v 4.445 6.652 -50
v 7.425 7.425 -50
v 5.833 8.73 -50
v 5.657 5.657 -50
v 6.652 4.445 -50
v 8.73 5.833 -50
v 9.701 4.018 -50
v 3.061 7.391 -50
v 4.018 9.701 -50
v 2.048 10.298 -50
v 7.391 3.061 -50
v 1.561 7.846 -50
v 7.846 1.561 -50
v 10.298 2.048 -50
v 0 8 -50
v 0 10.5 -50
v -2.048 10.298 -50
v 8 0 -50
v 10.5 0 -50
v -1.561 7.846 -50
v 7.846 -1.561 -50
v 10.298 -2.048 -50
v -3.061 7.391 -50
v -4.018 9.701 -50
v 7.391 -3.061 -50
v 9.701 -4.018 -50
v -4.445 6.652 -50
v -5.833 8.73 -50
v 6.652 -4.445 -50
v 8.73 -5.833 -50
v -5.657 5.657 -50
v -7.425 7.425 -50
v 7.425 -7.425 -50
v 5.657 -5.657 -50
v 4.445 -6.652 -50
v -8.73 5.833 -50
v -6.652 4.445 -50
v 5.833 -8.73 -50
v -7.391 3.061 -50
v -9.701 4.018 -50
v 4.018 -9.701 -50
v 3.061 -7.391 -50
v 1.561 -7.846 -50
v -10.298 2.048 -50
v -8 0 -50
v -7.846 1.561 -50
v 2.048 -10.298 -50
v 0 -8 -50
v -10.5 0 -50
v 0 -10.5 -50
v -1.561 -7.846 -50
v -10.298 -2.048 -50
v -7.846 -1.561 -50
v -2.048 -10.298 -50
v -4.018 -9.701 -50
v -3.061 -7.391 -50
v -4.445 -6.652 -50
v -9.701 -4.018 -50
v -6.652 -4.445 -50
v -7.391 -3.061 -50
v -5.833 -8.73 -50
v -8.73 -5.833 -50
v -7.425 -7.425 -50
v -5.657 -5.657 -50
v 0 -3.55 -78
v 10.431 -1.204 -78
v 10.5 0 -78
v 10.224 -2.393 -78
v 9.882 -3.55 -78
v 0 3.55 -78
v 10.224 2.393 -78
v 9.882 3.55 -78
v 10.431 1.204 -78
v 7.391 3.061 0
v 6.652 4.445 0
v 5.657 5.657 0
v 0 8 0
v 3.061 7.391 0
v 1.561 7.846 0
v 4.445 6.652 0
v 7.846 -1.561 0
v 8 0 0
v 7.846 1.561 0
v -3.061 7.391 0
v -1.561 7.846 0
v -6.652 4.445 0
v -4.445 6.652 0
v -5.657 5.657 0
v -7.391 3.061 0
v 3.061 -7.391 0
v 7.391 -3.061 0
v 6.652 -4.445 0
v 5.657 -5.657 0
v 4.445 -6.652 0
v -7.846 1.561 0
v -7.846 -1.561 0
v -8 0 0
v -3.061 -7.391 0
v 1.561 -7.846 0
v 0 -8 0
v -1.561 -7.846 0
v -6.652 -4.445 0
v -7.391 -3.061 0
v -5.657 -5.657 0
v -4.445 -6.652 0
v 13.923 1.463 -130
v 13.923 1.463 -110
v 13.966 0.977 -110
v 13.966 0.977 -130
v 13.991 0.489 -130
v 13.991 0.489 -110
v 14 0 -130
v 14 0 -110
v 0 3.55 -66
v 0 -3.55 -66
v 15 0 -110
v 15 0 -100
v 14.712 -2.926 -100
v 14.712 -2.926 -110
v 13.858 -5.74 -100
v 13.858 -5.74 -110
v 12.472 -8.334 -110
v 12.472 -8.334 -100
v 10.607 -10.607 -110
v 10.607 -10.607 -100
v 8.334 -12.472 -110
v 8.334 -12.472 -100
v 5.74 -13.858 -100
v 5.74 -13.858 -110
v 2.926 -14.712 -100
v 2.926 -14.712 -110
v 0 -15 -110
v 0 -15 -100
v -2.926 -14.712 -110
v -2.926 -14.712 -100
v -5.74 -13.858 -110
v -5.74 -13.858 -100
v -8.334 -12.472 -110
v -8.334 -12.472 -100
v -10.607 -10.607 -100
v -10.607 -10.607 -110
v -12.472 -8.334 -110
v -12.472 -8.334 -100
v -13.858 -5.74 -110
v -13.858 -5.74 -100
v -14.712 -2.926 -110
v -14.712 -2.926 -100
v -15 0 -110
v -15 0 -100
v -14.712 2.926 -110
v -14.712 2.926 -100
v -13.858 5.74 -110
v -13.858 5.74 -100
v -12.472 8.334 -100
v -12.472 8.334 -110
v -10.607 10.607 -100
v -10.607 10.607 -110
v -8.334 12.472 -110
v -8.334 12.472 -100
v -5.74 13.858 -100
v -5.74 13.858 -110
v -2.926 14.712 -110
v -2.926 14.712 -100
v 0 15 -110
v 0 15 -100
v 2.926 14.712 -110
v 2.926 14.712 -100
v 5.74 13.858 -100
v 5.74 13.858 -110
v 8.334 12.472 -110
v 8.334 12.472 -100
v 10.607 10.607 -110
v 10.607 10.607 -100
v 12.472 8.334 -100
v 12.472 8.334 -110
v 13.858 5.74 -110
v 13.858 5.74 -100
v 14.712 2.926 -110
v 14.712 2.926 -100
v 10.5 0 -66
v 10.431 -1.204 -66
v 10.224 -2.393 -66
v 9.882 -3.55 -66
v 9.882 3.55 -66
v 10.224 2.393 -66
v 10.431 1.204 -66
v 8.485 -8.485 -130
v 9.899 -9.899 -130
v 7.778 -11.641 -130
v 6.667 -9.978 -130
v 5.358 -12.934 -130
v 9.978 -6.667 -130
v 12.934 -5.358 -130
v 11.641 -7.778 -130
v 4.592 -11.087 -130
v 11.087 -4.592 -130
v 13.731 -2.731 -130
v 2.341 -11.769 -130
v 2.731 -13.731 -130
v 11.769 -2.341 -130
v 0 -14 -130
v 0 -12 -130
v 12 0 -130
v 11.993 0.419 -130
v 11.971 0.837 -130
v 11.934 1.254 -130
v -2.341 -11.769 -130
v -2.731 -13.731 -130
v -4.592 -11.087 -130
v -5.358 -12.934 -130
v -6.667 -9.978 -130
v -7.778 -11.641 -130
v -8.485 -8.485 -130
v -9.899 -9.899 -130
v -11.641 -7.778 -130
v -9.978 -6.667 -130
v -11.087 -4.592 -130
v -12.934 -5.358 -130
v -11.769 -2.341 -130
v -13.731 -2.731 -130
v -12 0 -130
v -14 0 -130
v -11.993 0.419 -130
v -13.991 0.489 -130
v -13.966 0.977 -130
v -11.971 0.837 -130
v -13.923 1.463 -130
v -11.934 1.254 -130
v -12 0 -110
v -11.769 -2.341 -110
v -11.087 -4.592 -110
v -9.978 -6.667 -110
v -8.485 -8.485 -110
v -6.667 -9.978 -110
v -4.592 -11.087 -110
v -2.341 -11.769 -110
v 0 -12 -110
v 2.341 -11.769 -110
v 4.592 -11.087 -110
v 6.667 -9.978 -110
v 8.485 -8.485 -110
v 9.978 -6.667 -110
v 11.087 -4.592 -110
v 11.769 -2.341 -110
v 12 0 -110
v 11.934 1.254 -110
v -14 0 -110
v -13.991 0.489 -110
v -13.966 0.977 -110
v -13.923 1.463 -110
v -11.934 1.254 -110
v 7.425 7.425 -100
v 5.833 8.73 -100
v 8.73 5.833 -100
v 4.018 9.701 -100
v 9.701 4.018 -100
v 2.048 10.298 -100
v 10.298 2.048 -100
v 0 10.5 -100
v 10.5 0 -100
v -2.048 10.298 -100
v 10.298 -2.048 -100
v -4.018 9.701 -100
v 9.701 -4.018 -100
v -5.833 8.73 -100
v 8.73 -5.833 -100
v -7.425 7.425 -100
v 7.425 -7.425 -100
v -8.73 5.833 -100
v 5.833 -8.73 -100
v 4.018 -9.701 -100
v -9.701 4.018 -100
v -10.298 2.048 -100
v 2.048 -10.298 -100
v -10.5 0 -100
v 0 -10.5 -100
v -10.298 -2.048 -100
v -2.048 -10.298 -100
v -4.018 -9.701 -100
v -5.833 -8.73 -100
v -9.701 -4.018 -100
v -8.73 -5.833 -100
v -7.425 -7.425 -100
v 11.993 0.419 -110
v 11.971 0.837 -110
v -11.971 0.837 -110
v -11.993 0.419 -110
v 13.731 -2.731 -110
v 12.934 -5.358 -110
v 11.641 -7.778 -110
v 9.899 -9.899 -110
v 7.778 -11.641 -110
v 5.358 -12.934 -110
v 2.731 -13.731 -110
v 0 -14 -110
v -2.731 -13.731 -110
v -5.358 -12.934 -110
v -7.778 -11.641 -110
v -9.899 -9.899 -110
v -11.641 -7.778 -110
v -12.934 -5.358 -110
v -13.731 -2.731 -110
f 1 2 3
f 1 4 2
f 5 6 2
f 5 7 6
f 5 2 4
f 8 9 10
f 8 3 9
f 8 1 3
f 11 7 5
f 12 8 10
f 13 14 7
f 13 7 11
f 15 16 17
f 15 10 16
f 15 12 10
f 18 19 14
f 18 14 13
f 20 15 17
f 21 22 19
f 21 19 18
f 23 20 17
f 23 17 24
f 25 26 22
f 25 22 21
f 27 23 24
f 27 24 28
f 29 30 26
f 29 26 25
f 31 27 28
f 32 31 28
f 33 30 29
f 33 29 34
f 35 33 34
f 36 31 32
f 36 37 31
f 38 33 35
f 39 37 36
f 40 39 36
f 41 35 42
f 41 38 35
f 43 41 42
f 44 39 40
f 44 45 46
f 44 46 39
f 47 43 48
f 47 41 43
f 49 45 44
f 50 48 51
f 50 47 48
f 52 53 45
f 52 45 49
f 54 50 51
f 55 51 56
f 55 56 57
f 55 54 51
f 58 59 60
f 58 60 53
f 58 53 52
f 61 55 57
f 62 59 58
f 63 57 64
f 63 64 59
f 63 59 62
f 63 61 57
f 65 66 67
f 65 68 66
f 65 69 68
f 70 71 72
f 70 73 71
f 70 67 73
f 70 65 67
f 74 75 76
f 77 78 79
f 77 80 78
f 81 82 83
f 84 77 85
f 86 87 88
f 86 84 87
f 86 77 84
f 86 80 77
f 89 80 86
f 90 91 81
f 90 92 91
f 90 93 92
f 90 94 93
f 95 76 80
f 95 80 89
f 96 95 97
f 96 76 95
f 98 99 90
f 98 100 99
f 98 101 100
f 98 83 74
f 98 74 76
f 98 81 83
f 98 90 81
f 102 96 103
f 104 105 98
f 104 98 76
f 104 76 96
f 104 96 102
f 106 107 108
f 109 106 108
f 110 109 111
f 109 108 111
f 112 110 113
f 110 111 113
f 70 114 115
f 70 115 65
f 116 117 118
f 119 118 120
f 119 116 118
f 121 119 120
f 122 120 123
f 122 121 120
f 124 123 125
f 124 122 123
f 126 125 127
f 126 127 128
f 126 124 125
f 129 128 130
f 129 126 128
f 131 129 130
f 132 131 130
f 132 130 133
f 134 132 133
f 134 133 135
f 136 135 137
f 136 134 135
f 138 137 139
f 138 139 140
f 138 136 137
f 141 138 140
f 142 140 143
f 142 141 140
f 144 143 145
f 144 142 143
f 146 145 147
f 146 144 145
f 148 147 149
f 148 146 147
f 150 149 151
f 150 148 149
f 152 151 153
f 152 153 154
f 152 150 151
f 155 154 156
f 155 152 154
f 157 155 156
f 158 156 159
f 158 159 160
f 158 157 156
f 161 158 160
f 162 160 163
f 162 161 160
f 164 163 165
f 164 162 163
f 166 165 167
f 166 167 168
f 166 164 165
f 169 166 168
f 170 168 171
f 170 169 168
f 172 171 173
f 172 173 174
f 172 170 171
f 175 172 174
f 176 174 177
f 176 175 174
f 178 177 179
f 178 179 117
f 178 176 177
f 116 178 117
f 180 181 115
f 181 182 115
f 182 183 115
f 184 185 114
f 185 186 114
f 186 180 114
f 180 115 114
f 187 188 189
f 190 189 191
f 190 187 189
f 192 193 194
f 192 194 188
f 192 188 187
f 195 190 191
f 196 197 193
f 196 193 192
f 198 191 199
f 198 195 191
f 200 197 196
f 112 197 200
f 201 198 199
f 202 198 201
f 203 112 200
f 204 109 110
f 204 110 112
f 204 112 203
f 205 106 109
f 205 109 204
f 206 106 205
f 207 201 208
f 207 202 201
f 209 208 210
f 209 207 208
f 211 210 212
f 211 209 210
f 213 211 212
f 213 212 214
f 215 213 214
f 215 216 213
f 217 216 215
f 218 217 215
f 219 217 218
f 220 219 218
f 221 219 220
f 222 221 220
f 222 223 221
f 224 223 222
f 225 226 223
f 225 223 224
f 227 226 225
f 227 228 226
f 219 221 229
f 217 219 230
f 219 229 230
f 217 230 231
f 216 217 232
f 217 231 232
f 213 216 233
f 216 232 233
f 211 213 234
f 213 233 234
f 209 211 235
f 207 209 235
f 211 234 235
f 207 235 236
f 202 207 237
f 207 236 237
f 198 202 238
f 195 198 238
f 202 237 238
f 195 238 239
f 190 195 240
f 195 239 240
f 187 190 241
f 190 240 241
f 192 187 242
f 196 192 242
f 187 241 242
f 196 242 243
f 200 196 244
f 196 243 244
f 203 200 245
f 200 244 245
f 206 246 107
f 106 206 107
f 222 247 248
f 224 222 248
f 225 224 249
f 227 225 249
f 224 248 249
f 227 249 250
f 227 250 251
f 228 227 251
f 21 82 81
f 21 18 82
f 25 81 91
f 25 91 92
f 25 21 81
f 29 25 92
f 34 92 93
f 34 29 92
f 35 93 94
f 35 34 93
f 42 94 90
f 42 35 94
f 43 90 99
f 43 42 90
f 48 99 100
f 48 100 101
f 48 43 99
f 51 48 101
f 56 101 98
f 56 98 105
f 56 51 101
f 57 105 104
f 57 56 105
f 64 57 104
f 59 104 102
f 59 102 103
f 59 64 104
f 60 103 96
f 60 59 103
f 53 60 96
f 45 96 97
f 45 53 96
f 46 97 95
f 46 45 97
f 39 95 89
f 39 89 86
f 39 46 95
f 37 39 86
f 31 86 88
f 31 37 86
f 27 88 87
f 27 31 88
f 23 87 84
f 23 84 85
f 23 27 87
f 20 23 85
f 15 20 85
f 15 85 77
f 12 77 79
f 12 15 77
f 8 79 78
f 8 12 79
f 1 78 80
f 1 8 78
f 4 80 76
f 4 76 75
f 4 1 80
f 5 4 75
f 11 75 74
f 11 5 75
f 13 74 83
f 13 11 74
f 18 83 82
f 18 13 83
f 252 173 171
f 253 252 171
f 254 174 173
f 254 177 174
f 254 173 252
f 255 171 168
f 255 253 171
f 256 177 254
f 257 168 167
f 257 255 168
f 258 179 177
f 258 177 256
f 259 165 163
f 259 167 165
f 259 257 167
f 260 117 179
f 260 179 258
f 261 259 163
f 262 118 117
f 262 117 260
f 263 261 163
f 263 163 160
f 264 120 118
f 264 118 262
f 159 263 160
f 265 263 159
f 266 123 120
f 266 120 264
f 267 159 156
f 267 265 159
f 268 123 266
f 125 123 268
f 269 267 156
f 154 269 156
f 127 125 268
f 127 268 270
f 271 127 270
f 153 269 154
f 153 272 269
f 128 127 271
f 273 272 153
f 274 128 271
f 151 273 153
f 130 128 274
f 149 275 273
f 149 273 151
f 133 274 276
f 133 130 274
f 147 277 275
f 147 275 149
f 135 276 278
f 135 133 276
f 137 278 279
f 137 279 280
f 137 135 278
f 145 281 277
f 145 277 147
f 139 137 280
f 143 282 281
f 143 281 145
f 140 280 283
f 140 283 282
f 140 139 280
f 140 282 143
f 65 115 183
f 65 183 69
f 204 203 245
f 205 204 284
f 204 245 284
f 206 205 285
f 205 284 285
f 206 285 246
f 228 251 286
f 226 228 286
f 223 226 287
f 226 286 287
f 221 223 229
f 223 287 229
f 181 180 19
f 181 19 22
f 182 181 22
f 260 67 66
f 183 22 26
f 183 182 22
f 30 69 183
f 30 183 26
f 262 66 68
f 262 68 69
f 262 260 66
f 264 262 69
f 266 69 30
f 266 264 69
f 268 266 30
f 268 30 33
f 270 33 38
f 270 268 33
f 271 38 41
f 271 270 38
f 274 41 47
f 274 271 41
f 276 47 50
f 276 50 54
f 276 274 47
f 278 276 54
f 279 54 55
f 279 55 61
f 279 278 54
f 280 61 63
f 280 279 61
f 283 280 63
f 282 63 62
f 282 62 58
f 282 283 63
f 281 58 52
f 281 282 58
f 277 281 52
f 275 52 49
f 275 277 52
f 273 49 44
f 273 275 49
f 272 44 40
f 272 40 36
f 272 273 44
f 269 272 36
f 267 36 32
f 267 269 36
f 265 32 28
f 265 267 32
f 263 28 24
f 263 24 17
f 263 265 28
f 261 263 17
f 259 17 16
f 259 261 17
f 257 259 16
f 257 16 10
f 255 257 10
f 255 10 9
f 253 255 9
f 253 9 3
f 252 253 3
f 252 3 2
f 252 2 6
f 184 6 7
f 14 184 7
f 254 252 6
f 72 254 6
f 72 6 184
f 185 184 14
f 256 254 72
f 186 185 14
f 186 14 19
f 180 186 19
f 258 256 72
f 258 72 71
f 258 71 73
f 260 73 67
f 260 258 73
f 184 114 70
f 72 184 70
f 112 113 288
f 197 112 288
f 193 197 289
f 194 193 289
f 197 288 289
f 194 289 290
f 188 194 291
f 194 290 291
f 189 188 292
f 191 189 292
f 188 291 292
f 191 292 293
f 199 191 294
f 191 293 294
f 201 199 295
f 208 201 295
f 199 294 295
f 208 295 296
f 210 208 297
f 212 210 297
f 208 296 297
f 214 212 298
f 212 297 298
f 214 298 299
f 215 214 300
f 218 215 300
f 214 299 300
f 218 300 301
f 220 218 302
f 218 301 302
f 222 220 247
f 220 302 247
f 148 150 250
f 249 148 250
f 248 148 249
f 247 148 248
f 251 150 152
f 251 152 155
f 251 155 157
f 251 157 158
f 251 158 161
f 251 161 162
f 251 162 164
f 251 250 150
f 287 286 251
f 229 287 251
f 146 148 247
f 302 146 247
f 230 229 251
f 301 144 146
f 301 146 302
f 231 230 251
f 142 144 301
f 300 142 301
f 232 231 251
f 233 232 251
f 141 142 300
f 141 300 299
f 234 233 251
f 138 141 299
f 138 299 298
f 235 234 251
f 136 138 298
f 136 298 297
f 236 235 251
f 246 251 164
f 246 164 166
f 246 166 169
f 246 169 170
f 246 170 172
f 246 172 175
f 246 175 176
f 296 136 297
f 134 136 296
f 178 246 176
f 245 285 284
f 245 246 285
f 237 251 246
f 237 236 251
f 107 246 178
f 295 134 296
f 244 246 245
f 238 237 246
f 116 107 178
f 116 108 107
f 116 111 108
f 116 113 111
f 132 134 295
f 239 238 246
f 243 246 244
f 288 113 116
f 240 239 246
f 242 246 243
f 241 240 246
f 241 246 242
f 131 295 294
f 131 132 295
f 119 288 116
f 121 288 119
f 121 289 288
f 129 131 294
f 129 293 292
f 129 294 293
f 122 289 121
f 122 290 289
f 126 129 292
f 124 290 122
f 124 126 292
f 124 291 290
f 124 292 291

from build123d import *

# Parameters (mm, degrees)
BOSS_EXTRUDE3_DEPTH = 20
SKETCH4_W           = 12
SKETCH4_H           = 7.1
CUT_EXTRUDE1_DEPTH  = 132.719398723


with BuildPart() as part:
    # Sketch2 → Revolve4 (revolve)
    with BuildSketch(Plane(origin=(0, 0, 0), x_dir=(1, 0, 0), z_dir=(0, 1, 0))):
        Polygon((0, 0), (8, 0), (8, 50), (10.5, 50), (10.5, 100), (15, 100), (15, 110), (0, 110), align=None)
    revolve(axis=Axis((0, 0, 0), (0, 0, -1)))

    # Sketch3 → Boss-Extrude3 (add)
    with BuildSketch(Plane(origin=(0, 0, -110), x_dir=(-1, 0, 0), z_dir=(0, 0, -1))):
        with BuildLine():
            Line((-14, 0), (-12, 0))
            ThreePointArc((-12, 0), (-11.983554417, 0.628031475), (-11.934262744, 1.254341559))
            Line((-11.934262744, 1.254341559), (-13.923306535, 1.463398486))
            ThreePointArc((-13.923306535, 1.463398486), (-13.980813487, 0.732703387), (-14, 0))
        make_face()
        with BuildLine():
            Line((14, 0), (12, 0))
            ThreePointArc((12, 0), (0, -12), (-12, 0))
            Line((-12, 0), (-14, 0))
            ThreePointArc((-14, 0), (0, -14), (14, 0))
        make_face()
        with BuildLine():
            ThreePointArc((11.934262744, 1.254341559), (11.983554417, 0.628031475), (12, 0))
            Line((12, 0), (14, 0))
            ThreePointArc((14, 0), (13.980813487, 0.732703387), (13.923306535, 1.463398486))
            Line((13.923306535, 1.463398486), (11.934262744, 1.254341559))
        make_face()
    extrude(amount=BOSS_EXTRUDE3_DEPTH)

    # Sketch4 → Cut-Extrude1 (cut, through all)
    with BuildSketch(Plane(origin=(0, 0, 0), x_dir=(0, 0, -1), z_dir=(1, 0, 0))):
        with Locations((72, 0)):
            Rectangle(SKETCH4_W, SKETCH4_H)
    extrude(amount=CUT_EXTRUDE1_DEPTH, mode=Mode.SUBTRACT)


solid = part.part
